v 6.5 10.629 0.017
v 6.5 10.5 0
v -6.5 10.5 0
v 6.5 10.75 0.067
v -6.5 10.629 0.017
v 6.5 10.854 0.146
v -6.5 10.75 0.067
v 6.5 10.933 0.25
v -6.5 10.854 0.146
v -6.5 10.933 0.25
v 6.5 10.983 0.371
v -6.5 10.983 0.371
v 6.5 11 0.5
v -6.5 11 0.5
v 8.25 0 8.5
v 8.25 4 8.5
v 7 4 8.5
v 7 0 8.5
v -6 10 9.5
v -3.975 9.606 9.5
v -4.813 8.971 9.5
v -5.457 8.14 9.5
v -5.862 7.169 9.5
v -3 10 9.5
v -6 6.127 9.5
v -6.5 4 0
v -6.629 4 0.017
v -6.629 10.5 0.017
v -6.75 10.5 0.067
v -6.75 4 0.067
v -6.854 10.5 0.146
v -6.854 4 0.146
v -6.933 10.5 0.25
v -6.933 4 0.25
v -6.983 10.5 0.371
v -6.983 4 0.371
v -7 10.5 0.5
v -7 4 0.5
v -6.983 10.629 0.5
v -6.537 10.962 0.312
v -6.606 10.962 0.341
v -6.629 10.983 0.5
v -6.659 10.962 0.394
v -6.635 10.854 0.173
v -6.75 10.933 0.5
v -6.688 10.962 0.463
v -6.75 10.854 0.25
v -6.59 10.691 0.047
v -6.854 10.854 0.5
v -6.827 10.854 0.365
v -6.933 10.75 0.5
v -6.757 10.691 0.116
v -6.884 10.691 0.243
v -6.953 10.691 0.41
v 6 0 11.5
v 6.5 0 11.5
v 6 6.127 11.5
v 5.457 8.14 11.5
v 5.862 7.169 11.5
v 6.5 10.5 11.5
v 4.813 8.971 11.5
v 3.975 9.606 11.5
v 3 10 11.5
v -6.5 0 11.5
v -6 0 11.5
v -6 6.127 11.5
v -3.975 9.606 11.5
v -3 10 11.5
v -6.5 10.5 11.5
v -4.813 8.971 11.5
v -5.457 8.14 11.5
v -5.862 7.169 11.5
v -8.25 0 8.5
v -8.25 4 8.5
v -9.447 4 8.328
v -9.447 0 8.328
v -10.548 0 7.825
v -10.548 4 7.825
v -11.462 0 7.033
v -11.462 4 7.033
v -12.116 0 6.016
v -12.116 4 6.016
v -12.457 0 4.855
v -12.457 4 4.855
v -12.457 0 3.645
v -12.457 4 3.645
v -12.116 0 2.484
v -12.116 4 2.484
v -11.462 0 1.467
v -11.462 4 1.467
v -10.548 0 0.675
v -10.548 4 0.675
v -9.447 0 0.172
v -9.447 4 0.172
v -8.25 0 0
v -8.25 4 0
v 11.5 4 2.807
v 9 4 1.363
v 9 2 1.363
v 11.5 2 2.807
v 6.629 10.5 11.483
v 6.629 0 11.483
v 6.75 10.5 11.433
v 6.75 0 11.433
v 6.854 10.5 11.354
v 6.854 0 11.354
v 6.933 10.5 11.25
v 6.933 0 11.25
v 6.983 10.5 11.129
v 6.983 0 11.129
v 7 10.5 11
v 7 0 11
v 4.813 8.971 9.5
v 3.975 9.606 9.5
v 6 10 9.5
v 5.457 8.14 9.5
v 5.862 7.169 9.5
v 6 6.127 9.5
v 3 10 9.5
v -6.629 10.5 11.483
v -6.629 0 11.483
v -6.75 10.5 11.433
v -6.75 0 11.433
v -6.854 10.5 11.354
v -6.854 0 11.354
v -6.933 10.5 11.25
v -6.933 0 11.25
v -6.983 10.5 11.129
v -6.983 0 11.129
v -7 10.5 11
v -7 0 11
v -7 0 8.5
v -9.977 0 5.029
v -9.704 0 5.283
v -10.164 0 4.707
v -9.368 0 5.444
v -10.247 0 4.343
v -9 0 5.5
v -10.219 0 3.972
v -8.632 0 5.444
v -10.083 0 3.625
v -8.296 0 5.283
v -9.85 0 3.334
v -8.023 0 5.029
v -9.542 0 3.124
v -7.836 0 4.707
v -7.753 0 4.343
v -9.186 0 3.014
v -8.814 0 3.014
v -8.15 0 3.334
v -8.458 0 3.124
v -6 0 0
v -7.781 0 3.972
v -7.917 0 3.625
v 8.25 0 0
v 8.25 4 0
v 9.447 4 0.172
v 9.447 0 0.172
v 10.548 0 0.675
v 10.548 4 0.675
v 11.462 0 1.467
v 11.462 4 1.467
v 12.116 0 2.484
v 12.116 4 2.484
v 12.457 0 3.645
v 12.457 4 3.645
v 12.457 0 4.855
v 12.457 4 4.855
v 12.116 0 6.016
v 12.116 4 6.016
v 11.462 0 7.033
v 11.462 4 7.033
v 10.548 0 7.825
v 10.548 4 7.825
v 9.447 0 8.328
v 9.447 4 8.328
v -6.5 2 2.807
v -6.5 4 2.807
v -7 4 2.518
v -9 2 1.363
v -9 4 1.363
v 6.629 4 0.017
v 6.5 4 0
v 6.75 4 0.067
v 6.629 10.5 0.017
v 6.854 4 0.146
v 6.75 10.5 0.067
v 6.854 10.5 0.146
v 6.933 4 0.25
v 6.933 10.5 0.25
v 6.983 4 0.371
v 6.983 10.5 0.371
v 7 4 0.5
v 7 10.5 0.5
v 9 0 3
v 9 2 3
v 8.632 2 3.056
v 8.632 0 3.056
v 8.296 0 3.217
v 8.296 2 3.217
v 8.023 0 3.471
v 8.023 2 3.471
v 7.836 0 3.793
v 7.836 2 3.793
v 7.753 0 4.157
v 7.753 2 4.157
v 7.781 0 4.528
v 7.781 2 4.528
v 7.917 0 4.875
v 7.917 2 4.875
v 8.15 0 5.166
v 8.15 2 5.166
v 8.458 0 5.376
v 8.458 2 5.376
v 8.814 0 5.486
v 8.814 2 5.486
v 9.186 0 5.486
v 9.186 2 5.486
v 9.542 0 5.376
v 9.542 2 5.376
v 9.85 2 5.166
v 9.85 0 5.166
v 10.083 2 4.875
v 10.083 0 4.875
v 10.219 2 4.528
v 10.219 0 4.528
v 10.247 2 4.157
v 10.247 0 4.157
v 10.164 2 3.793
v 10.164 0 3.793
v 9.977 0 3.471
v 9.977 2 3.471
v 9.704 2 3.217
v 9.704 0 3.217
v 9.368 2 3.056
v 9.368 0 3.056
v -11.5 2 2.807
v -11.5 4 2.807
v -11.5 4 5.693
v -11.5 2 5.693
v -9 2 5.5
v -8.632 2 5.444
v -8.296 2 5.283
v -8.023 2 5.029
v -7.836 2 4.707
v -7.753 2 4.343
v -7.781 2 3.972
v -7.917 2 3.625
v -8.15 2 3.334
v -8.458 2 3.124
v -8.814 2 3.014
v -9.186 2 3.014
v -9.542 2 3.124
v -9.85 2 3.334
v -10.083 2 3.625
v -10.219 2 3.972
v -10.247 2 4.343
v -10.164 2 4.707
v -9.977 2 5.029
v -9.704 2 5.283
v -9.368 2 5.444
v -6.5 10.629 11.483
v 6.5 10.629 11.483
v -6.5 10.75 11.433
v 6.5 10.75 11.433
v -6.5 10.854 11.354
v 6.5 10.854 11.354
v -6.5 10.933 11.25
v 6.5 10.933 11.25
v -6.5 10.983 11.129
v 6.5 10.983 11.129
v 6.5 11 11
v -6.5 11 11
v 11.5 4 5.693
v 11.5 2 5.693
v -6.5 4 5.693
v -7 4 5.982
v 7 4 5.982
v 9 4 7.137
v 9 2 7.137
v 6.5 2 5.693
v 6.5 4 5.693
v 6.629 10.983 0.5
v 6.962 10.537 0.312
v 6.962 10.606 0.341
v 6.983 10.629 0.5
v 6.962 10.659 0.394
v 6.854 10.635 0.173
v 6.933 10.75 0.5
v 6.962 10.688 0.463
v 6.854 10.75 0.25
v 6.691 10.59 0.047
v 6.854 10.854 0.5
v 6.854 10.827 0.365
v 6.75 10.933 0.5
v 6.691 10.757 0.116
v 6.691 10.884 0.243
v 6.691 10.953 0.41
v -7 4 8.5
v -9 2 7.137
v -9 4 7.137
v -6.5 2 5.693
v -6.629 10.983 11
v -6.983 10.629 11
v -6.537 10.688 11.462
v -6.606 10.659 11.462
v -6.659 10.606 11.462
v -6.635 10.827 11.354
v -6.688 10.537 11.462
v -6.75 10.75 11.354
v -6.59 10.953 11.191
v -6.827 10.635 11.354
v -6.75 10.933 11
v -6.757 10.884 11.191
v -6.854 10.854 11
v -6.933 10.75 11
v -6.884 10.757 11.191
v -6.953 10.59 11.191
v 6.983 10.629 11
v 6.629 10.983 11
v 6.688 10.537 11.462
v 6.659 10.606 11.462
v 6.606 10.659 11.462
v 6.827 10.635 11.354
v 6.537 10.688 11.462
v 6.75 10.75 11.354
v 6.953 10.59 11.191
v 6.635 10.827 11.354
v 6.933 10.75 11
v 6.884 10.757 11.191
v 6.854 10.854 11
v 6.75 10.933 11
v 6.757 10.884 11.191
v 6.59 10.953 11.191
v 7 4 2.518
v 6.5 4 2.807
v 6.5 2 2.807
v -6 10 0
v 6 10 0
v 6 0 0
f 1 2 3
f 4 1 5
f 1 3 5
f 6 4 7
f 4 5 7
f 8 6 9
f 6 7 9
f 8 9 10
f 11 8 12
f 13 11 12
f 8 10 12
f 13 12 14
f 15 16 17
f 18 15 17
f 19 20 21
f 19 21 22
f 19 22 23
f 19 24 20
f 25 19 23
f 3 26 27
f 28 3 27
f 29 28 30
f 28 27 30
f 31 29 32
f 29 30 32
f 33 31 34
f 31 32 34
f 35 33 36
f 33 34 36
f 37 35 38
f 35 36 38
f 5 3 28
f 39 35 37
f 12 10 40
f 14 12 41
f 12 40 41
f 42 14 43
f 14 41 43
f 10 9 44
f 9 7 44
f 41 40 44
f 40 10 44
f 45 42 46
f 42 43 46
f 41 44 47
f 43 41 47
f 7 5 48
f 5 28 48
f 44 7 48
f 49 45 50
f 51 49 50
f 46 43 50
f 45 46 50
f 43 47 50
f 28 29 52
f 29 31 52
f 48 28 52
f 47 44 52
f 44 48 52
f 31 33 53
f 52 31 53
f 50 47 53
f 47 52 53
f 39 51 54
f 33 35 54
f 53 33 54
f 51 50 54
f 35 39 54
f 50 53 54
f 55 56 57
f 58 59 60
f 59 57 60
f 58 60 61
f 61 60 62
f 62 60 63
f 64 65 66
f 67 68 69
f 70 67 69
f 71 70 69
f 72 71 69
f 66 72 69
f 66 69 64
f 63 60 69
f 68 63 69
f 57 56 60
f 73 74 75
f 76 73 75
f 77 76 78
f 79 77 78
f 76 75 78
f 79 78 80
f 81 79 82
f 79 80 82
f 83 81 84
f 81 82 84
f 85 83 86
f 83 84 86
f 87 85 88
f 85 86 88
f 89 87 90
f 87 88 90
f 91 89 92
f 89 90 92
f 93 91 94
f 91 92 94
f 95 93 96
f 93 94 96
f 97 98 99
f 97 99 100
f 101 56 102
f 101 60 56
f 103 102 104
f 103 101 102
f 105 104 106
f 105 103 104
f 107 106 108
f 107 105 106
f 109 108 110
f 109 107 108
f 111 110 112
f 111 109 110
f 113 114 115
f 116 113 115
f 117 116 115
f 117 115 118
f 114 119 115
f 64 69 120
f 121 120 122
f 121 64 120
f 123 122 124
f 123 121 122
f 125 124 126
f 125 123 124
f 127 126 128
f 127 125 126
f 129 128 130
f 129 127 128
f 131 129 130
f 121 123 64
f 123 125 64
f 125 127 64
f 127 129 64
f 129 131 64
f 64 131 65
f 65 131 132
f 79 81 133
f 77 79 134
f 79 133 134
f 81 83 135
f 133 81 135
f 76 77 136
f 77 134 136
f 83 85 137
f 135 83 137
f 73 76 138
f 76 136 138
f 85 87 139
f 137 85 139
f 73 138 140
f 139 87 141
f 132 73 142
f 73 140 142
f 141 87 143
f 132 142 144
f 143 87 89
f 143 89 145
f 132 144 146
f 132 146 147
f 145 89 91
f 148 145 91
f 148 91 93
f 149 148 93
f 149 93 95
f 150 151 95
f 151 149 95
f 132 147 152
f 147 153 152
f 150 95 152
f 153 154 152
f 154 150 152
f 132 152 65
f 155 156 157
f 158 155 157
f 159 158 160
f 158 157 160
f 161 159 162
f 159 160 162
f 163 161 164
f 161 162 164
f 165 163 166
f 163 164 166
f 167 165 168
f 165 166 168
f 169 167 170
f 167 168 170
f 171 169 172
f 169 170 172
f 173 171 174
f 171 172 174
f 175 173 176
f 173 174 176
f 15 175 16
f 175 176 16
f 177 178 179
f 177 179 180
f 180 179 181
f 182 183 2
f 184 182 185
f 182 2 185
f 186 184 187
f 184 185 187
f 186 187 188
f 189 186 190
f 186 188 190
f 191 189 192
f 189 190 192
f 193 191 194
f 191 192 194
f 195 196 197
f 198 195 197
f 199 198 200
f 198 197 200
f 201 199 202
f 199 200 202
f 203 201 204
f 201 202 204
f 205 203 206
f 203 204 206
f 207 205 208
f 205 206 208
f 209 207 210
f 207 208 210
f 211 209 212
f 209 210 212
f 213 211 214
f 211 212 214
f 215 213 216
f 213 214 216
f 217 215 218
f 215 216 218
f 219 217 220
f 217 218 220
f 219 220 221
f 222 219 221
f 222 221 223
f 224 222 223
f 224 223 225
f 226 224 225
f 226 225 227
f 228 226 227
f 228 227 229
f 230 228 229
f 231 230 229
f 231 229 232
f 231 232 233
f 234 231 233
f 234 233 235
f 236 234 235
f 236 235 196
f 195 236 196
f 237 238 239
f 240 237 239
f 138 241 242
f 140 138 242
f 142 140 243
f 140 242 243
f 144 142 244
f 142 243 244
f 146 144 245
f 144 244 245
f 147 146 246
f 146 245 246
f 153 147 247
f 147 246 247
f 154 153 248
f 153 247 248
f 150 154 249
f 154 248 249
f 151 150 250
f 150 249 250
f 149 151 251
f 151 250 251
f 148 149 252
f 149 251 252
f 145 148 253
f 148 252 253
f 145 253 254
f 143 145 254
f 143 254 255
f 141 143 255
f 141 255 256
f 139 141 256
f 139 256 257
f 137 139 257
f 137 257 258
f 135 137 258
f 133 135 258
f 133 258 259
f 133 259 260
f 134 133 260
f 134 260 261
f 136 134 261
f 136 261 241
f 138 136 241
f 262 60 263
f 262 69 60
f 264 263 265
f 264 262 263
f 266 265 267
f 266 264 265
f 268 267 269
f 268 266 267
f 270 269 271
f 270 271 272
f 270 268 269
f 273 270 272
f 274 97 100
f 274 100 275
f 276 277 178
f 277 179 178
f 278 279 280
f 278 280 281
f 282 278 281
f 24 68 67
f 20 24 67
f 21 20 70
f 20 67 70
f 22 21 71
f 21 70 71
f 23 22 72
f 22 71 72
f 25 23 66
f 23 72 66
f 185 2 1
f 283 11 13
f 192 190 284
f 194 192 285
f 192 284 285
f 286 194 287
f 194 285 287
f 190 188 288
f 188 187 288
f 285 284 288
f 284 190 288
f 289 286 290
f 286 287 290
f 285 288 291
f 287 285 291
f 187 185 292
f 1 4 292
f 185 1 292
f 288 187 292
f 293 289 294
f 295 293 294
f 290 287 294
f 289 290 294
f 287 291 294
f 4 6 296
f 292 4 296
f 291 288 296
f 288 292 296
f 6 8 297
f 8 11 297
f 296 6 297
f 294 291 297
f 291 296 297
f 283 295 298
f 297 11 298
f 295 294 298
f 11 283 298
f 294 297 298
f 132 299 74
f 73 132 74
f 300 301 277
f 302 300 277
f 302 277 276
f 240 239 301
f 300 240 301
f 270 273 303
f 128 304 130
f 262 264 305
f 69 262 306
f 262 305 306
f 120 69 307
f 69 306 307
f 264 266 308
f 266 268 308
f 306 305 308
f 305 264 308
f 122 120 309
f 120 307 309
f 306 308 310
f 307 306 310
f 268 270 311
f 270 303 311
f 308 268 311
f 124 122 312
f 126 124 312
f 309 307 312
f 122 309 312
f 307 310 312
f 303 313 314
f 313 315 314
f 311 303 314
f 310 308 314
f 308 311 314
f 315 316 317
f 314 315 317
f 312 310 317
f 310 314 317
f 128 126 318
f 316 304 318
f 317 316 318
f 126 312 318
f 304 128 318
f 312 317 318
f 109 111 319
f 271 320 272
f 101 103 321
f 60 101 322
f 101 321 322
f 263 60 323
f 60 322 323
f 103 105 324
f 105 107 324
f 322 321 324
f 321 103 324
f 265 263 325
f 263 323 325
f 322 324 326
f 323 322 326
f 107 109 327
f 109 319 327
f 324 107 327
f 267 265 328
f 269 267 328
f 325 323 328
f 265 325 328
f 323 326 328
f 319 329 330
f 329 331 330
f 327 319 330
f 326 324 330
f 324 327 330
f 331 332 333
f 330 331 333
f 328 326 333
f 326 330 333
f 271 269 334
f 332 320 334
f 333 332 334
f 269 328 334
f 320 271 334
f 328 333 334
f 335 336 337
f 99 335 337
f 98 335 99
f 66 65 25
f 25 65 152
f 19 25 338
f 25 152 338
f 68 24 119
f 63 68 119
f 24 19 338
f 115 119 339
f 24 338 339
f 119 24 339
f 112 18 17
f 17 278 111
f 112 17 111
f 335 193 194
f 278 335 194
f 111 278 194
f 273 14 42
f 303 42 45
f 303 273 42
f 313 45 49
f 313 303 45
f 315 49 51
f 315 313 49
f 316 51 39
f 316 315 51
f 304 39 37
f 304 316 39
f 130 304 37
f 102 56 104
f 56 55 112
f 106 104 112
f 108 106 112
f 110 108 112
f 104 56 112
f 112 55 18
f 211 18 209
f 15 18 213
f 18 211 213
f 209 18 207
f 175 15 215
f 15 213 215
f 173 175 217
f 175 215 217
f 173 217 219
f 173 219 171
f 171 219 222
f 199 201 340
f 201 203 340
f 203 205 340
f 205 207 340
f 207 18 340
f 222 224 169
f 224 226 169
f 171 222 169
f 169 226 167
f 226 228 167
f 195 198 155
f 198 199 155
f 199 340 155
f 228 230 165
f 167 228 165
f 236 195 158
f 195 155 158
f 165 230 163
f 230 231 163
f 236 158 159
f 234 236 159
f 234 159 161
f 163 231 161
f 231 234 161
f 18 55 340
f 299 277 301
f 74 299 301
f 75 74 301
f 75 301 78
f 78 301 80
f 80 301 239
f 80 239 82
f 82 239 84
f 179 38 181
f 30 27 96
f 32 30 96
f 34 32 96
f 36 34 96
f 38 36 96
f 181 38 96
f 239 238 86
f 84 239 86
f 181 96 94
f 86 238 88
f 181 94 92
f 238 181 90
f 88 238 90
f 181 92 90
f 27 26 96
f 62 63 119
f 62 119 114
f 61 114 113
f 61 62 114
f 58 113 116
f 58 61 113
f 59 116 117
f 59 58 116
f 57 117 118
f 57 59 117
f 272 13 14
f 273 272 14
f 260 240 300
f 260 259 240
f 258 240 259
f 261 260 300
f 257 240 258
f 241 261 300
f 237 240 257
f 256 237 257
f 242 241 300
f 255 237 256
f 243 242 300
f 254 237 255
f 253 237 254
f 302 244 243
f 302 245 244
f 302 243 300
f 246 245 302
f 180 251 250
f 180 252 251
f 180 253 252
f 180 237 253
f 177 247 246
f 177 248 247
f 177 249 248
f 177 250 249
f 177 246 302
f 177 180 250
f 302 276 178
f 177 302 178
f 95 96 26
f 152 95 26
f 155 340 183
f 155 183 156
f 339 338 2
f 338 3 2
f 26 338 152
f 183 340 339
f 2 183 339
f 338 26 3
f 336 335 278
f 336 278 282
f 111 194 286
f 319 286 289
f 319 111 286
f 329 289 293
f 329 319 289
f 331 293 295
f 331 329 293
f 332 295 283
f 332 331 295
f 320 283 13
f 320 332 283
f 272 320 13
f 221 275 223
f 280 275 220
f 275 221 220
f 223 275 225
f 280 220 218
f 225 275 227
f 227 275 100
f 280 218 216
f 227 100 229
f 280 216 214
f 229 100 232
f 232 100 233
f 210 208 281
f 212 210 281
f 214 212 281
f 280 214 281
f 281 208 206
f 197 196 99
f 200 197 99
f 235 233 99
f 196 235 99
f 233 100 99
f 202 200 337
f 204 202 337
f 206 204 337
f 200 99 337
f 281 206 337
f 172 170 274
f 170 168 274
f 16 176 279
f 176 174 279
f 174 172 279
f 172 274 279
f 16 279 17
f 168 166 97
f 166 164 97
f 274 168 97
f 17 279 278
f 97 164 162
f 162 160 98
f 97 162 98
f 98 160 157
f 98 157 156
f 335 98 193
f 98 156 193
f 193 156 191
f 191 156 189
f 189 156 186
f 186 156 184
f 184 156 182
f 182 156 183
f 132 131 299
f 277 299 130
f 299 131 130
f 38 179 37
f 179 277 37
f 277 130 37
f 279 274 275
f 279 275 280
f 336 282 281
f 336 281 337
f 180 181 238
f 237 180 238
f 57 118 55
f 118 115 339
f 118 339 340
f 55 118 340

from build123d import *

# Parameters (mm, degrees)
P_IDAT_VYSUNUT_M1_DEPTH  = 11.5
SKICA3_OUTSIDE_W         = 32.928
SKICA3_OUTSIDE_H         = 19.428
ODEBRAT_VYSUNUT_M1_DEPTH = 19.371173071
SKICA4_R                 = 1.25
ODEBRAT_VYSUNUT_M2_DEPTH = 19.371173071
ODEBRAT_VYSUNUT_M3_DEPTH = 2
P_IDAT_VYSUNUT_M2_DEPTH  = 2
ZAOBLIT2_R               = 0.5


with BuildPart() as part:
    # Skica1 → Přidat vysunutím1 (new body)
    with BuildSketch(Plane.XY):
        Polygon((-12.5, 0), (-6, 0), (-6, 10), (6, 10), (6, 0), (12.5, 0), (12.5, 4), (7, 4), (7, 11), (-7, 11), (-7, 4), (-12.5, 4), align=None)
    extrude(amount=P_IDAT_VYSUNUT_M1_DEPTH)

    # Skica3 outside → Odebrat vysunutím1 (cut, through all)
    with BuildSketch(Plane(origin=(0, 4, 0), x_dir=(1, 0, 0), z_dir=(0, 1, 0))):
        with Locations((0, -5.75)):
            Rectangle(SKICA3_OUTSIDE_W, SKICA3_OUTSIDE_H)
        with BuildLine():
            Line((-8.25, 0), (-7, 0))
            Line((-7, 0), (7, 0))
            Line((7, 0), (8.25, 0))
            ThreePointArc((8.25, 0), (12.5, -4.25), (8.25, -8.5))
            Line((8.25, -8.5), (7, -8.5))
            Line((7, -8.5), (7, -11.5))
            Line((7, -11.5), (-7, -11.5))
            Line((-7, -11.5), (-7, -8.5))
            Line((-7, -8.5), (-8.25, -8.5))
            ThreePointArc((-8.25, -8.5), (-12.5, -4.25), (-8.25, 0))
        make_face(mode=Mode.SUBTRACT)
    extrude(amount=-ODEBRAT_VYSUNUT_M1_DEPTH, mode=Mode.SUBTRACT)

    # Skica4 → Odebrat vysunutím2 (cut, through all)
    with BuildSketch(Plane(origin=(0, 4, 0), x_dir=(1, 0, 0), z_dir=(0, 1, 0))):
        with Locations(Location((-9, -4.25, 0), (0, 0, 270))):
            Circle(SKICA4_R)
        with Locations(Location((9, -4.25, 0), (0, 0, 90))):
            Circle(SKICA4_R)
    extrude(amount=-ODEBRAT_VYSUNUT_M2_DEPTH, mode=Mode.SUBTRACT)

    # Skica5 → Odebrat vysunutím3 (cut)
    with BuildSketch(Plane(origin=(0, 4, 0), x_dir=(1, 0, 0), z_dir=(0, 1, 0))):
        Polygon((-6.5, -5.693375673), (-6.5, -2.806624327), (-9, -1.363248654), (-11.5, -2.806624327), (-11.5, -5.693375673), (-9, -7.136751346), align=None)
        Polygon((9, -7.136751346), (6.5, -5.693375673), (6.5, -2.806624327), (9, -1.363248654), (11.5, -2.806624327), (11.5, -5.693375673), align=None)
    extrude(amount=-ODEBRAT_VYSUNUT_M3_DEPTH, mode=Mode.SUBTRACT)

    # Skica6 → Přidat vysunutím2 (add)
    with BuildSketch(Plane.XY.offset(11.5)):
        with BuildLine():
            Line((-6, 10), (-3, 10))
            ThreePointArc((-3, 10), (-5.16227766, 8.576506397), (-6, 6.127016654))
            Line((-6, 6.127016654), (-6, 10))
        make_face()
        with BuildLine():
            Line((6, 6.127016654), (6, 10))
            Line((6, 10), (3, 10))
            ThreePointArc((3, 10), (5.16227766, 8.576506397), (6, 6.127016654))
        make_face()
    extrude(amount=-P_IDAT_VYSUNUT_M2_DEPTH)

    # Zaoblit2
    zaoblit2_edges = [part.edges().sort_by_distance(p)[0] for p in [
        (-7, 7.5, 0),
        (0, 11, 0),
        (7, 7.5, 0),
        (-7, 11, 5.75),
        (7, 11, 5.75),
        (7, 5.5, 11.5),
        (0, 11, 11.5),
        (-7, 5.5, 11.5),
    ]]
    fillet(zaoblit2_edges, radius=ZAOBLIT2_R)


solid = part.part
